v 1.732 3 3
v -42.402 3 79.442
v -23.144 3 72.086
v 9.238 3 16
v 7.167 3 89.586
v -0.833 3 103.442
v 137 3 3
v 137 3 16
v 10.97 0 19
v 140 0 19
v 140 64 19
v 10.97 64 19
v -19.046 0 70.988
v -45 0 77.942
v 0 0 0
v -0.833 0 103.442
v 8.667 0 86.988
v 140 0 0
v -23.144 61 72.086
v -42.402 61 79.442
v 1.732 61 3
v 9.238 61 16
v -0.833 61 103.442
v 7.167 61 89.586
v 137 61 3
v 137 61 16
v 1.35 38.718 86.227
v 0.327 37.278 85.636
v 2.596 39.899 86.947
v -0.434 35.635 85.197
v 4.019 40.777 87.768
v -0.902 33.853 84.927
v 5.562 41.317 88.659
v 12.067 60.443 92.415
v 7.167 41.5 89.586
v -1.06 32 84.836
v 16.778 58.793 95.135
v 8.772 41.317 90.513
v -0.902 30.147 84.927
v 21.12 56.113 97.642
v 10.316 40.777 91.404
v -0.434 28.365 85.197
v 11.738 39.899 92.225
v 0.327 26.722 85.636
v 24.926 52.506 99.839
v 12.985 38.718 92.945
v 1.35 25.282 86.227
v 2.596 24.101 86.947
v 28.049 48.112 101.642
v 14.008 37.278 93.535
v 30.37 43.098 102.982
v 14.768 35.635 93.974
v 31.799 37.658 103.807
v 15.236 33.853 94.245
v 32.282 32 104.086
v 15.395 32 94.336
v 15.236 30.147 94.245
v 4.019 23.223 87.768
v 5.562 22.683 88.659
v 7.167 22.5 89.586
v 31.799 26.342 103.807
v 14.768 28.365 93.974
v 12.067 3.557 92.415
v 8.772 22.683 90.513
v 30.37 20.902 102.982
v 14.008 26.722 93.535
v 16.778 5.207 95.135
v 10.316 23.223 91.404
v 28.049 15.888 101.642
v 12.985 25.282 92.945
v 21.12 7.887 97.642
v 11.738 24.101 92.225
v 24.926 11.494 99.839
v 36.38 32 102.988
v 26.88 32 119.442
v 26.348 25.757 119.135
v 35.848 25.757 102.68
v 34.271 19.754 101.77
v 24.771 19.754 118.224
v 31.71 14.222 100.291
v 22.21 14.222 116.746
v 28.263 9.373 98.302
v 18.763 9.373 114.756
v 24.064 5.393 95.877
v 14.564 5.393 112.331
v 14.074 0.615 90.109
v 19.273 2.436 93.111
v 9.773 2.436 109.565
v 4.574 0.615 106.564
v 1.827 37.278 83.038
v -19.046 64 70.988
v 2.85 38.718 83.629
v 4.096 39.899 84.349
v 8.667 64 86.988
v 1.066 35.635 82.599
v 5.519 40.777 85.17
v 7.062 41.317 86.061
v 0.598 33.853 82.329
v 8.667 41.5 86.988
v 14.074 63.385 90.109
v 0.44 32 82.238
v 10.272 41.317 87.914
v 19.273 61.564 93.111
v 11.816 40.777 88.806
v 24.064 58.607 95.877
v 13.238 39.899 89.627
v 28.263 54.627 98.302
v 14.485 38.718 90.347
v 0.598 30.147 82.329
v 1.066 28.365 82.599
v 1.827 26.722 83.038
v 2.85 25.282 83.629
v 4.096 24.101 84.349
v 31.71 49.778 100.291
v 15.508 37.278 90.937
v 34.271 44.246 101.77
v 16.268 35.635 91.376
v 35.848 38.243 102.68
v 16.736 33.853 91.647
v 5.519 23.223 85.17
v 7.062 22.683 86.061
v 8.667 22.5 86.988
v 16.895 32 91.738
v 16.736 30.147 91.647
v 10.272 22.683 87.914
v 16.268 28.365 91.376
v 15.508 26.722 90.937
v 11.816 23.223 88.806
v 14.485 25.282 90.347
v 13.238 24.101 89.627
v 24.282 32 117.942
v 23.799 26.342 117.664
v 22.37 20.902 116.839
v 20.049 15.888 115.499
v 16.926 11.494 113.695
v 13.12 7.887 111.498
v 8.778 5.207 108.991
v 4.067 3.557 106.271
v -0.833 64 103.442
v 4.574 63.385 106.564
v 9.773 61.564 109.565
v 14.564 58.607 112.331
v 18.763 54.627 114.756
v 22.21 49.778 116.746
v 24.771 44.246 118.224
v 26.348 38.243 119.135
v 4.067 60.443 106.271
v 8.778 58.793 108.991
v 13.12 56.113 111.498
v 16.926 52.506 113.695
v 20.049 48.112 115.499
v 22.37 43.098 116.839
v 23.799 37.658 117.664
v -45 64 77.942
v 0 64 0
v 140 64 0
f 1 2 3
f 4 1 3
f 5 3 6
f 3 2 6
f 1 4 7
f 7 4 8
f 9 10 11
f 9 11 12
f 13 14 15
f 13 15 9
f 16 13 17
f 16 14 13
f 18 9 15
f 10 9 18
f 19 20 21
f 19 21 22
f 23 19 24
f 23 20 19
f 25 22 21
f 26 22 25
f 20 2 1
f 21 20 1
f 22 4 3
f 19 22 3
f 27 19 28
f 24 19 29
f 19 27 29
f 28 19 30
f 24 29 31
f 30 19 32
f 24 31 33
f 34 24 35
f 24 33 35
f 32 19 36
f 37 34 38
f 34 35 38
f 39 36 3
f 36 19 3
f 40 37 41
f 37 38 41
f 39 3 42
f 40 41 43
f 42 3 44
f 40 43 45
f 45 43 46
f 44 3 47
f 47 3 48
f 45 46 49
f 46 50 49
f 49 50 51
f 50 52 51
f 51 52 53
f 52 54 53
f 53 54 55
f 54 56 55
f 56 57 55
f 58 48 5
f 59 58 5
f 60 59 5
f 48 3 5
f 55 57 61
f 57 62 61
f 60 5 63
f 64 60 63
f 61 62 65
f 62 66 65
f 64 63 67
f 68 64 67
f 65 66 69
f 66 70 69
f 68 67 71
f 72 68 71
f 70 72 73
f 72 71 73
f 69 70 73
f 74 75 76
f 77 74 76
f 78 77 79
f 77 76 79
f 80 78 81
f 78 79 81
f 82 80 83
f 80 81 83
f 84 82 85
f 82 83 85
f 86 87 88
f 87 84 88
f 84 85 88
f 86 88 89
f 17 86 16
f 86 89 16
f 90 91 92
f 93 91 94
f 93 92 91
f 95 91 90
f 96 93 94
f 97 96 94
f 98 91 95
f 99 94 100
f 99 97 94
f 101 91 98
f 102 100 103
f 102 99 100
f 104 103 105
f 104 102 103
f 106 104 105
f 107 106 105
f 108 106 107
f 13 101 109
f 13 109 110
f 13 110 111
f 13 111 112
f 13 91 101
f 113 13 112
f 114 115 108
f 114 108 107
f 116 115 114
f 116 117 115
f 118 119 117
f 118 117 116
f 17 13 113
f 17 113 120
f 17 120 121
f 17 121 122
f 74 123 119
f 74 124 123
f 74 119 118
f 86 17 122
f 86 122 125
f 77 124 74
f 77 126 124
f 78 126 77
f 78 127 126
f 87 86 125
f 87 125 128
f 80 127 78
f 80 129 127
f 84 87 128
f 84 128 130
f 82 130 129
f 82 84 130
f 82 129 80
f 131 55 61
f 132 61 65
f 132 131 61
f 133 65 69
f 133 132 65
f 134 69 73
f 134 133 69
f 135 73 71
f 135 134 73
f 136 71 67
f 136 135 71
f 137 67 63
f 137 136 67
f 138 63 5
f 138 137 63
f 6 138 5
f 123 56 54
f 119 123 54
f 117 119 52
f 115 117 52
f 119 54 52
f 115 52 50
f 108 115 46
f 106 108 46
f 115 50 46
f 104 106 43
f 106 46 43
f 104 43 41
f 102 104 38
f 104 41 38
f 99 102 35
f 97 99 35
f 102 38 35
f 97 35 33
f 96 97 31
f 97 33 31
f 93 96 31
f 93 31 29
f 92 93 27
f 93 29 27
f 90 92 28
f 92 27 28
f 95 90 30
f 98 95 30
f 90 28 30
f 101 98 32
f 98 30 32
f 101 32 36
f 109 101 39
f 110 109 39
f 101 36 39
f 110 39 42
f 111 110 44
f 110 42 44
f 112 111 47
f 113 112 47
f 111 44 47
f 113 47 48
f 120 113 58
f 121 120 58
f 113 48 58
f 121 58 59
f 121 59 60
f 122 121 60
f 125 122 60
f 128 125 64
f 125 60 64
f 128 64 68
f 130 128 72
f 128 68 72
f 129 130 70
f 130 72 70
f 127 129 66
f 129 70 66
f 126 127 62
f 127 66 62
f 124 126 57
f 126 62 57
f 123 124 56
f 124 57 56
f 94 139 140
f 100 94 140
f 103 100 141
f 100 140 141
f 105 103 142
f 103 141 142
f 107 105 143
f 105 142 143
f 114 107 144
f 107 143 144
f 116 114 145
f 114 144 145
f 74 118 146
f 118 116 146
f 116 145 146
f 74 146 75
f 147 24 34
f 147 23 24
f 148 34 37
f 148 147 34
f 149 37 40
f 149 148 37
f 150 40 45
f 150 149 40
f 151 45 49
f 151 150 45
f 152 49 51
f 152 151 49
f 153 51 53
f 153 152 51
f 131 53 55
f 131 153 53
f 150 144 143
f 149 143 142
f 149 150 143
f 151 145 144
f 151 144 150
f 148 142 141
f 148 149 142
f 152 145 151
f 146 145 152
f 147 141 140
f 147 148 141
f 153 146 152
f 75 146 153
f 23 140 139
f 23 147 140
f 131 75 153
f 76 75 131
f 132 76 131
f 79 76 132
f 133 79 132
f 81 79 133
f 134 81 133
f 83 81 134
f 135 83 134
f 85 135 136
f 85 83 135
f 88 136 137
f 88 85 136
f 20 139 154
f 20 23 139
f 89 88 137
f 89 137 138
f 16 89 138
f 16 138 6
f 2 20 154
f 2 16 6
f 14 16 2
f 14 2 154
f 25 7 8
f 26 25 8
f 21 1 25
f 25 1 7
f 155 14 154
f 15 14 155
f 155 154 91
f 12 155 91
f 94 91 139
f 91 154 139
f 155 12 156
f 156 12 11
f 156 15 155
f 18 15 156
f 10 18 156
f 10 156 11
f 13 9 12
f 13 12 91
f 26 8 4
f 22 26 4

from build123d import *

# Parameters (mm, degrees)
F1_DEPTH = 64
F3_DEPTH = 25
F4_T     = -3
F5_R     = 9.5
F6_DEPTH = 3


with BuildPart() as f1:
    # F0 (on Front) → F1 (new body)
    with BuildSketch(Plane.XZ):
        Polygon((-45, 77.9422863406), (0, 0), (140, 0), (140, 19), (10.9696551146, 19), (-19.0455173281, 70.9878036687), (36.3801085141, 102.9878036687), (26.8801085141, 119.4422863406), align=None)
    extrude(amount=-F1_DEPTH)

    # F2 (on face) → F3 (cut)
    with BuildSketch(Plane(origin=(-45, 0, 77.9422863406), x_dir=(0.8660254038, 0, 0.5), z_dir=(-0.5, 0, 0.8660254038))):
        with BuildLine():
            ThreePointArc((51, 64), (73.627416998, 54.627416998), (83, 32))
            Line((83, 32), (83, 64))
            Line((83, 64), (51, 64))
        make_face()
        with BuildLine():
            Line((83, 0), (83, 32))
            ThreePointArc((83, 32), (73.627416998, 9.372583002), (51, 0))
            Line((51, 0), (83, 0))
        make_face()
    extrude(amount=-F3_DEPTH, mode=Mode.SUBTRACT)

    # F4
    f4_openings = [f1.faces().sort_by_distance(p)[0] for p in [
        (-11.74342, 32, 97.142982),
    ]]
    offset(amount=F4_T, openings=f4_openings, kind=Kind.INTERSECTION)

    # F5 (on face) → F6 (cut, through all)
    with BuildSketch(Plane(origin=(-37, 0, 64.08587988), x_dir=(0.8660254038, 0, 0.5), z_dir=(-0.5, 0, 0.8660254038))):
        with Locations((51, 32)):
            Circle(F5_R)
    extrude(amount=-F6_DEPTH, mode=Mode.SUBTRACT)


solid = f1.part
